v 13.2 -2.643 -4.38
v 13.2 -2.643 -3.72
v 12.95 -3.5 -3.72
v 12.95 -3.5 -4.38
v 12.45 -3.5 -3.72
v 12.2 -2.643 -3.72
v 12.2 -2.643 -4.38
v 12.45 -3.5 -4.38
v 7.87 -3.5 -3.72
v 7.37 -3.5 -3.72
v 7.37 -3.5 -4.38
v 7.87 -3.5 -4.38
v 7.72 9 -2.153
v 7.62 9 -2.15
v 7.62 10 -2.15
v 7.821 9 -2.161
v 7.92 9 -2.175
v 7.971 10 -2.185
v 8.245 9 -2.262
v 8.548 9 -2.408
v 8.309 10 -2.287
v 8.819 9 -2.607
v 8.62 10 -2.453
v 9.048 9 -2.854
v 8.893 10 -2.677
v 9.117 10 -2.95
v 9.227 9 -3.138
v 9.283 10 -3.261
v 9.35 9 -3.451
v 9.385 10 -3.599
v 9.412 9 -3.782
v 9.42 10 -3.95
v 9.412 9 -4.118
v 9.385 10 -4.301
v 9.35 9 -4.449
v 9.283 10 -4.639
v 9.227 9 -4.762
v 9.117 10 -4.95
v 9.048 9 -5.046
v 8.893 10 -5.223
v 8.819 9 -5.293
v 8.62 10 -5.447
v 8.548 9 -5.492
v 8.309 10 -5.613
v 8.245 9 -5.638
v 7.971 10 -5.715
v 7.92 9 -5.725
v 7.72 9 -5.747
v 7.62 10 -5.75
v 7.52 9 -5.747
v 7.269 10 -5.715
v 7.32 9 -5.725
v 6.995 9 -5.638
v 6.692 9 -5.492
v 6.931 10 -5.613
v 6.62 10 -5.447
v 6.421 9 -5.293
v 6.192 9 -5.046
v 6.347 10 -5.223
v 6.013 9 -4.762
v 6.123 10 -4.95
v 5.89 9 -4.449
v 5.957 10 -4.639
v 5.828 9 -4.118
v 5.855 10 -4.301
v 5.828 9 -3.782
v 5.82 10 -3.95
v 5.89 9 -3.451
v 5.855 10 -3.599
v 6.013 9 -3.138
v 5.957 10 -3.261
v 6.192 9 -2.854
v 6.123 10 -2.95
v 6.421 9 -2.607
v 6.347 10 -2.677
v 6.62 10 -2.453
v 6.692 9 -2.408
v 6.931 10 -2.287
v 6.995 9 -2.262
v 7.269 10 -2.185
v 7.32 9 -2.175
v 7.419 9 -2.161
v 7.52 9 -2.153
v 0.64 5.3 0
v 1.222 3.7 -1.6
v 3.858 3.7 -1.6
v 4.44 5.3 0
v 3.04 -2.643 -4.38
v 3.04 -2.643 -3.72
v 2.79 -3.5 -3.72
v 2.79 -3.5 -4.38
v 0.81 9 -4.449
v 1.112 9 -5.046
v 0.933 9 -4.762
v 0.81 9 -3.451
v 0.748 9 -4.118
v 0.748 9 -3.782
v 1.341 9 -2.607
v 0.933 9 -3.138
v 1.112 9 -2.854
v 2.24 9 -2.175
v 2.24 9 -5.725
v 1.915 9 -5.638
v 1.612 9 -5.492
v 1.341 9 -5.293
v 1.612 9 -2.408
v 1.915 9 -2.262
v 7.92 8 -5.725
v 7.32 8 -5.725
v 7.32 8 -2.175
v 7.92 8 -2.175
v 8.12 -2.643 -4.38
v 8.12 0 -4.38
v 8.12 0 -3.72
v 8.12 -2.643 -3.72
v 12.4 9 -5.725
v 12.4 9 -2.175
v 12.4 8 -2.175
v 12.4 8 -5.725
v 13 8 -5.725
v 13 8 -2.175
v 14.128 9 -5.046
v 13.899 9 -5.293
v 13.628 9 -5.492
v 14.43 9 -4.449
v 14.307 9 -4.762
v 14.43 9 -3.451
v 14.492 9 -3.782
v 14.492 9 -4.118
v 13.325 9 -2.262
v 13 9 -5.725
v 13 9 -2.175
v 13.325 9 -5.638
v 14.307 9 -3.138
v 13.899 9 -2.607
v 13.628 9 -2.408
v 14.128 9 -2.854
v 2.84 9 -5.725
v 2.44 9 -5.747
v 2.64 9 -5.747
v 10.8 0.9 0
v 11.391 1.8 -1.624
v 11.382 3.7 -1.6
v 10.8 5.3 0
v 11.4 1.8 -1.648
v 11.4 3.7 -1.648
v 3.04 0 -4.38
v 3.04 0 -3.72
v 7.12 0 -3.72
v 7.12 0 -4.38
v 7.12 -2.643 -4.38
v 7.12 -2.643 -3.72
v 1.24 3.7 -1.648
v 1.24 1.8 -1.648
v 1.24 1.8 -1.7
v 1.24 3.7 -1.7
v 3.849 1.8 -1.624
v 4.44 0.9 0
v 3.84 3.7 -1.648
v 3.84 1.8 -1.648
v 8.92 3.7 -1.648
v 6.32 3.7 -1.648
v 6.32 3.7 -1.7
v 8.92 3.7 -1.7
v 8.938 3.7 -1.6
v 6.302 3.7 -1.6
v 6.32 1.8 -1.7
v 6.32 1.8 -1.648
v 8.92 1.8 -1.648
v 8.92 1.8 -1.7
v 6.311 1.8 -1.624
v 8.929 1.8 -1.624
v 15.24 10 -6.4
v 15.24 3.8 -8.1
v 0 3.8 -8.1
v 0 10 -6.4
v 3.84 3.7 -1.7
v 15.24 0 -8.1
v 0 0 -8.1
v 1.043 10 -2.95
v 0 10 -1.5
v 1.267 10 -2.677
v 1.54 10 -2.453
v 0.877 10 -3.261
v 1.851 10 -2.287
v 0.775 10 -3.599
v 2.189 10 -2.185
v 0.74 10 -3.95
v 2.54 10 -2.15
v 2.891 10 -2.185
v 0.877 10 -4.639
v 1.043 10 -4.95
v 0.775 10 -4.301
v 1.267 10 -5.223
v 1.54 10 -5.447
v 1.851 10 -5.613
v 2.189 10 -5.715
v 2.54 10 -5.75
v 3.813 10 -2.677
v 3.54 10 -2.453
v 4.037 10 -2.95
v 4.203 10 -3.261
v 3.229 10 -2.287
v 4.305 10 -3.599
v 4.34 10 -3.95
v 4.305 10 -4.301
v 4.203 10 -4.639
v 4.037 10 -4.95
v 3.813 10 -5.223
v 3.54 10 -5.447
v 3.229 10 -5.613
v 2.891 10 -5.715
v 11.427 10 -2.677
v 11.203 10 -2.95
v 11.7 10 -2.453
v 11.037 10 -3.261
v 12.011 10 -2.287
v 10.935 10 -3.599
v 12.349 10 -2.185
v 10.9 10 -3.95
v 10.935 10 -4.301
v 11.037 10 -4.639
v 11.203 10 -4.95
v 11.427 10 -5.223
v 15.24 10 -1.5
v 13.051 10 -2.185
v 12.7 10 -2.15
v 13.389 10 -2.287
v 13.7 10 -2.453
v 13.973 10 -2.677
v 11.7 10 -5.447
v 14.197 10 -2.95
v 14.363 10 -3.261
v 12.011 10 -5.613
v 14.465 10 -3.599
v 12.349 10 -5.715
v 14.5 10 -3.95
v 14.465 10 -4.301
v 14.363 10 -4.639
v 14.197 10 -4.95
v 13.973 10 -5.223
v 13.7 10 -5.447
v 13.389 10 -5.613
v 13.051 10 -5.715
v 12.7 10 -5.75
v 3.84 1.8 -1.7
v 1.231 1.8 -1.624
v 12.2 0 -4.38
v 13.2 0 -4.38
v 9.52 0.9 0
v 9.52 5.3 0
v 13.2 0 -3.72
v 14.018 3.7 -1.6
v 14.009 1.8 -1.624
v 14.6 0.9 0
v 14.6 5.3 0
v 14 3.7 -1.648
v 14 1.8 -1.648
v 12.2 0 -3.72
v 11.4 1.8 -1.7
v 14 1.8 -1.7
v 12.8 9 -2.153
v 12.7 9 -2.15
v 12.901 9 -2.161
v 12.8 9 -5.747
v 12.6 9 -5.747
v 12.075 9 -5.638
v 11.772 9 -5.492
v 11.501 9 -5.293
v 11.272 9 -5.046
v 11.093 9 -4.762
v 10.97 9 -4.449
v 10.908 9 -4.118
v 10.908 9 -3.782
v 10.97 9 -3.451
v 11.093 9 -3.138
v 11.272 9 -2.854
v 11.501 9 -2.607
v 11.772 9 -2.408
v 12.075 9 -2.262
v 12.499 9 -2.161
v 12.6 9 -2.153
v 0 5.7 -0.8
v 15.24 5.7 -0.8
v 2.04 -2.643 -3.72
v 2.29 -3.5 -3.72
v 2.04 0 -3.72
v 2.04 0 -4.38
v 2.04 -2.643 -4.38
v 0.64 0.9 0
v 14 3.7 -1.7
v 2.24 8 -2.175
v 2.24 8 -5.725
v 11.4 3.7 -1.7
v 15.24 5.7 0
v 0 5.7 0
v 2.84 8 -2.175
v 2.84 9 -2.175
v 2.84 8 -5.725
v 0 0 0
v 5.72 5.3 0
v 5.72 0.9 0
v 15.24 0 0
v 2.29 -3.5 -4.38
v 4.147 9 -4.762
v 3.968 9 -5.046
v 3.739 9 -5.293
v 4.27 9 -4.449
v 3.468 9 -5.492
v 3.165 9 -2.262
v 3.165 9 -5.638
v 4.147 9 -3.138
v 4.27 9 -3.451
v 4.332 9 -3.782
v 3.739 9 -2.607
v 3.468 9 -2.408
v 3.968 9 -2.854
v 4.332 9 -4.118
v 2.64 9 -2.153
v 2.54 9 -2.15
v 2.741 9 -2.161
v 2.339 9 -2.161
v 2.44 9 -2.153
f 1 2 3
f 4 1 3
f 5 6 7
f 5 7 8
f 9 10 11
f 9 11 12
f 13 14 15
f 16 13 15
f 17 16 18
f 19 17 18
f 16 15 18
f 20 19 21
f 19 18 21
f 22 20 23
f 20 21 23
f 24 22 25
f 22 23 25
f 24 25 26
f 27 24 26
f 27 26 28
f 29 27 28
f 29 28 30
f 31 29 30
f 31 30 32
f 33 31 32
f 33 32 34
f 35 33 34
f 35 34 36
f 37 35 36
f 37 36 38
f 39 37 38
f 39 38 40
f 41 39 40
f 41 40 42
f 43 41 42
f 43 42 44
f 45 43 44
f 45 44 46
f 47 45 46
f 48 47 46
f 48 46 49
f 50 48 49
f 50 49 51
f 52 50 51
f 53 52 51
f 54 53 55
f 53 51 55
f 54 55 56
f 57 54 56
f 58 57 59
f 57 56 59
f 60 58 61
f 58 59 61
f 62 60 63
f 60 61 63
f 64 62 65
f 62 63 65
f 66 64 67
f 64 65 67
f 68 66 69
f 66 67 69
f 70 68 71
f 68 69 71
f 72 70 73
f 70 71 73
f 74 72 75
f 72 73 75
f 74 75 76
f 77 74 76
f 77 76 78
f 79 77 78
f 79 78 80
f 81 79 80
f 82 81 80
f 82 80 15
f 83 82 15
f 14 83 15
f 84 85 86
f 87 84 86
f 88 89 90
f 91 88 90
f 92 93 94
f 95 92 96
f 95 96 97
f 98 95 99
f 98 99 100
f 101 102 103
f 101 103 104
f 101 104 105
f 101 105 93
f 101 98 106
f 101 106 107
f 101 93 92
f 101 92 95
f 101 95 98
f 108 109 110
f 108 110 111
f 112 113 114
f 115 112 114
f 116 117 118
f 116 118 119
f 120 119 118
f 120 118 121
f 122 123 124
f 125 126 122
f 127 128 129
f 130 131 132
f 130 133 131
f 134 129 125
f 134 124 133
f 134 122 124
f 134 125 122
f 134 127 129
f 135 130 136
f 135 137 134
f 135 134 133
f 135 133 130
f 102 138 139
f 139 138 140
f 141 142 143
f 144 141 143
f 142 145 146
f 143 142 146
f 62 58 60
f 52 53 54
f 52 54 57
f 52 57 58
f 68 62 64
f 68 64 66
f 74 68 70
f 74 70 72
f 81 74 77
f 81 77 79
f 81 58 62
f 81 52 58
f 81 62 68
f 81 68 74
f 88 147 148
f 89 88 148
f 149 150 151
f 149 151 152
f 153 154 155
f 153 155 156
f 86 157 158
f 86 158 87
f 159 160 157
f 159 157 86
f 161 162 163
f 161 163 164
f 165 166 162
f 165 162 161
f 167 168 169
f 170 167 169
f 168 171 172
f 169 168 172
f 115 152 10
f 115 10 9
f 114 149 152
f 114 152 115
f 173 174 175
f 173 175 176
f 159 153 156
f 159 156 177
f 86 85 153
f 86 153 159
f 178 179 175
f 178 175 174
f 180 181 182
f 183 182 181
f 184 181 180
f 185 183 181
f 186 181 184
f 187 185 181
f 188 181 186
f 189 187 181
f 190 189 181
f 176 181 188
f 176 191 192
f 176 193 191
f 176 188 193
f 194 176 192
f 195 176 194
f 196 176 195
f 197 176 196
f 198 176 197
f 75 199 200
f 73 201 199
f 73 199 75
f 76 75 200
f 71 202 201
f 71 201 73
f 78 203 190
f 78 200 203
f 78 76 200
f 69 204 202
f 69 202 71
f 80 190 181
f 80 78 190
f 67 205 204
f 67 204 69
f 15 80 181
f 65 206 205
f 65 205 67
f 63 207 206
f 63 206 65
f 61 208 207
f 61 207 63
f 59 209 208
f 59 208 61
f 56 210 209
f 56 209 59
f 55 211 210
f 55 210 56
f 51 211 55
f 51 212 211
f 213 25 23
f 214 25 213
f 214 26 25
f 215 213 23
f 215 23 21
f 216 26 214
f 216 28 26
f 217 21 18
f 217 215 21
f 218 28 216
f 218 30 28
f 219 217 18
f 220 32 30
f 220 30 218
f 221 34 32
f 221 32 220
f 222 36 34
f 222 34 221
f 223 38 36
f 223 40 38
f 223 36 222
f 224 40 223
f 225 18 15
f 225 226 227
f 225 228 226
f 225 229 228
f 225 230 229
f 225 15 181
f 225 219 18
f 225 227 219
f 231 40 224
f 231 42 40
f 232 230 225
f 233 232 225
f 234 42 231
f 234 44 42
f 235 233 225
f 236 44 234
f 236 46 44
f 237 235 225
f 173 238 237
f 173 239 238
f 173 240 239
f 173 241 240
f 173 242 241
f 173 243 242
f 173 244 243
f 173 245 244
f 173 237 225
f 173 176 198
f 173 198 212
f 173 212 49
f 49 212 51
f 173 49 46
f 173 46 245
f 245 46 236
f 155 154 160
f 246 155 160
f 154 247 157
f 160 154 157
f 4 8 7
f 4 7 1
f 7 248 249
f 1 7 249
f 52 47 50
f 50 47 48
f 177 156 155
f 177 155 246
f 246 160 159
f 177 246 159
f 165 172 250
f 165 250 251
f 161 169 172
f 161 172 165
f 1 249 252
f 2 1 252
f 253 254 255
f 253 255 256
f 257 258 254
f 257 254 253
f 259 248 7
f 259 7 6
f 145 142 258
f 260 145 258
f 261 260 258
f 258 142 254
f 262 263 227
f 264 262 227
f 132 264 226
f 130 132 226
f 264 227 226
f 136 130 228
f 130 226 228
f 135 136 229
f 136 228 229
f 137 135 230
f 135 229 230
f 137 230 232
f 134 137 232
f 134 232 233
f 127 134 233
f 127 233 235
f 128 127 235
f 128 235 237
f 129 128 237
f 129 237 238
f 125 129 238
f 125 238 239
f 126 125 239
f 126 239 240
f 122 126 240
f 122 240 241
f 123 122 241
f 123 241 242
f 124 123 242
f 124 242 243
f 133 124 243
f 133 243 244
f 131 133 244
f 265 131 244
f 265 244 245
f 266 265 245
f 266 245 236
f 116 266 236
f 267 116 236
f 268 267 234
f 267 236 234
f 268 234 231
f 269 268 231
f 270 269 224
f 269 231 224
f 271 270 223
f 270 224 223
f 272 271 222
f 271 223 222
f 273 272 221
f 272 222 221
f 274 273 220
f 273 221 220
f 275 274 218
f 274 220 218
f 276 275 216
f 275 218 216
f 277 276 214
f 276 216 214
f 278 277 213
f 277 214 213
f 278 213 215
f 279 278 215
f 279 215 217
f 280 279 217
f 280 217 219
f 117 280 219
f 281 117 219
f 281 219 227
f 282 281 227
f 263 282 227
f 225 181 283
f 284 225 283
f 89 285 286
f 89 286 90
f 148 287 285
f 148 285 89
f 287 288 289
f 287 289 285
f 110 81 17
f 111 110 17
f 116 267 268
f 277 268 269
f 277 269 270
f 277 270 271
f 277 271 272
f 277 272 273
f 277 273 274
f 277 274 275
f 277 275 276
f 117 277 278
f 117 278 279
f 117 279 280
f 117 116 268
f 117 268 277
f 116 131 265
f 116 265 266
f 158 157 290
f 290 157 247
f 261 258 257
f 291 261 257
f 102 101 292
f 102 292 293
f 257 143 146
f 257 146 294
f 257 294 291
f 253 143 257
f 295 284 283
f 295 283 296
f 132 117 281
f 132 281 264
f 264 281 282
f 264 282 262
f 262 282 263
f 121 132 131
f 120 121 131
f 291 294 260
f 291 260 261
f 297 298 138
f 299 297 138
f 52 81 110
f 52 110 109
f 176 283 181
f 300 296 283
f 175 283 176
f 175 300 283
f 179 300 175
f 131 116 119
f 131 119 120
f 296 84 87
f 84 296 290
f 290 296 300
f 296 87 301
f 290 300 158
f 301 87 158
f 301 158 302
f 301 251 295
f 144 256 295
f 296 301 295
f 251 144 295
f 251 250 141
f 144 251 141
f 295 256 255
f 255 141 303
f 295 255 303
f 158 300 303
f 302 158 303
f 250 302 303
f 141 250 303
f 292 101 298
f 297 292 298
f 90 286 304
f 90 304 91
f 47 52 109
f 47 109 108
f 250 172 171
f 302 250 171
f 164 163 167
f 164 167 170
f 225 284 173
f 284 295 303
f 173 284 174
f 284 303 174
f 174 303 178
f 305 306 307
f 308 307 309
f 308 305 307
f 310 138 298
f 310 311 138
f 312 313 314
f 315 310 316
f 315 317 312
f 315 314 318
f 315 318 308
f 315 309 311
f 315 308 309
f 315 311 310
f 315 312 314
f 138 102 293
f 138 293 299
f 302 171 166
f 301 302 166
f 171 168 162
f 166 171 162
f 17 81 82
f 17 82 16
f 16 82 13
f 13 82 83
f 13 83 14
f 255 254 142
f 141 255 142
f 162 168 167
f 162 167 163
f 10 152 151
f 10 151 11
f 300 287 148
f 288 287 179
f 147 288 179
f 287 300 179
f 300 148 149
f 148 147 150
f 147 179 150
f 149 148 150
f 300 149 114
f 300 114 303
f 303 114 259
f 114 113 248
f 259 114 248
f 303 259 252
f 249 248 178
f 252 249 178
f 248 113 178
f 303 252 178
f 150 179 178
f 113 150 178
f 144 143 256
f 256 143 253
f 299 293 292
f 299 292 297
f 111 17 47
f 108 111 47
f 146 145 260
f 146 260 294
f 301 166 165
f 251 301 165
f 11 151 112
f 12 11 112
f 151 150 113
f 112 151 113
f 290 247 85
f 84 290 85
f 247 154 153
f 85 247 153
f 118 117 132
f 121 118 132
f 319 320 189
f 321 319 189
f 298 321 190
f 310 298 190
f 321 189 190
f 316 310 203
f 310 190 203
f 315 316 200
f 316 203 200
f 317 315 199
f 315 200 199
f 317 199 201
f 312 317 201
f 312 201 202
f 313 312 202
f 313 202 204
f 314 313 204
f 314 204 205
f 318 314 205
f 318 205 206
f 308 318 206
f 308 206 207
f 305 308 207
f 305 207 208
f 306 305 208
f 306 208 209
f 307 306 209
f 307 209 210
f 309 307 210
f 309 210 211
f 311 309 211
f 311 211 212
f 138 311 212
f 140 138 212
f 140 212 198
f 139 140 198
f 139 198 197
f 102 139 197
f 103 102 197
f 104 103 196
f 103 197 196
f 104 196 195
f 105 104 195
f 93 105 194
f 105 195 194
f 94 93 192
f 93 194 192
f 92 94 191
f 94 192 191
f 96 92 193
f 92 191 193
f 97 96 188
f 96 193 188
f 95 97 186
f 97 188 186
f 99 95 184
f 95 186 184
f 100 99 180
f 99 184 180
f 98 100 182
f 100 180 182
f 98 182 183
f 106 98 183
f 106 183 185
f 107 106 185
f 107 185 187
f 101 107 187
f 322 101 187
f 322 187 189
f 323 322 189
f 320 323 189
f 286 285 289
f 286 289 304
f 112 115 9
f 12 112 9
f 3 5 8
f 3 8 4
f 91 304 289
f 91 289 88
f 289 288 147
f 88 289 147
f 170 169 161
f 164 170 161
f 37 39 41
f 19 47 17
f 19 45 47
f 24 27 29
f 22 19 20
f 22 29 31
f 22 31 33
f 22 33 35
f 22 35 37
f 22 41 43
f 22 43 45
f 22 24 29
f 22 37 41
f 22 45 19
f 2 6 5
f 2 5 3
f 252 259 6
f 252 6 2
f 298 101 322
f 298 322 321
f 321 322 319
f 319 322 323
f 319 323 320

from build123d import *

# Parameters (mm, degrees)
SKETCH1_W                   = 15.24
SKETCH1_H                   = 8.1
BOSS_EXTRUDE1_DEPTH         = 10
CUT_EXTRUDE1_DEPTH          = 20.946618761
CUT_EXTRUDE2_DEPTH          = 20.946618761
SKETCH4_W                   = 1
SKETCH4_H                   = 0.66
BOSS_EXTRUDE2_DEPTH         = 3.5
CUT_EXTRUDE3_REACH          = 20.747
LPATTERN1_COUNT             = 3
LPATTERN1_PITCH             = 5.08
SKETCH6_W                   = 2.6
SKETCH6_H                   = 1.9
CUT_EXTRUDE4_DEPTH          = 1.7
CHAMFER1_SIZE               = 0.6
CHAMFER1_SIZE2              = 1.648486452
CHAMFER2_SIZE               = 0.6
CHAMFER2_SIZE2              = 1.648486452
CHAMFER3_SIZE               = 1.6
CHAMFER4_SIZE               = 0.9
CHAMFER4_SIZE2              = 1.62364298
LPATTERN2_COUNT             = 3
LPATTERN2_PITCH             = 5.08
CHAMFER1_OF_LPATTERN2_SIZE2 = 1.648486452
CHAMFER1_OF_LPATTERN2_SIZE  = 0.6
CHAMFER2_OF_LPATTERN2_SIZE2 = 1.648486452
CHAMFER2_OF_LPATTERN2_SIZE  = 0.6
CHAMFER3_OF_LPATTERN2_SIZE  = 1.6
CHAMFER4_OF_LPATTERN2_SIZE2 = 1.62364298
CHAMFER4_OF_LPATTERN2_SIZE  = 0.9
SKETCH7_R                   = 1.8
CUT_EXTRUDE5_DEPTH          = 1
SKETCH8_W                   = 0.6
SKETCH8_H                   = 3.54964787
CUT_EXTRUDE6_DEPTH          = 1
LPATTERN3_COUNT             = 3
LPATTERN3_PITCH             = 5.08


with BuildPart() as part:
    # Sketch1 → Boss-Extrude1 (new body)
    with BuildSketch(Plane(origin=(0, 0, 0), x_dir=(1, 0, 0), z_dir=(0, 1, 0))):
        with Locations((7.62, 4.05)):
            Rectangle(SKETCH1_W, SKETCH1_H)
    extrude(amount=BOSS_EXTRUDE1_DEPTH)

    # Sketch2 → Cut-Extrude1 (cut, through all)
    with BuildSketch(Plane(origin=(15.24, 0, 0), x_dir=(0, 0, -1), z_dir=(1, 0, 0))):
        Polygon((0, 10), (1.5, 10), (0.8, 5.7), (0, 5.7), align=None)
    extrude(amount=-CUT_EXTRUDE1_DEPTH, mode=Mode.SUBTRACT)

    # Sketch3 → Cut-Extrude2 (cut, through all)
    with BuildSketch(Plane(origin=(15.24, 0, 0), x_dir=(0, 0, -1), z_dir=(1, 0, 0))):
        Polygon((8.1, 3.8), (6.4, 10), (8.1, 10), align=None)
    extrude(amount=-CUT_EXTRUDE2_DEPTH, mode=Mode.SUBTRACT)

    # Sketch4 → Boss-Extrude2 (add)
    with BuildSketch(Plane.XZ):
        with Locations((2.54, -4.05)):
            Rectangle(SKETCH4_W, SKETCH4_H)
    boss_extrude2 = extrude(amount=BOSS_EXTRUDE2_DEPTH)

    # Sketch5 → Cut-Extrude3 (cut, up to next)
    with BuildSketch(Plane.XY.offset(-3.72), mode=Mode.PRIVATE) as cut_extrude3_sk1:
        Polygon((2.04, -2.643369181), (2.29, -3.5), (2.04, -3.5), align=None)
    cut_extrude3_tool1 = extrude(cut_extrude3_sk1.sketch, amount=-CUT_EXTRUDE3_REACH, mode=Mode.PRIVATE) & part.part
    # Sketch5 → Cut-Extrude3 (cut, up to next)
    with BuildSketch(Plane.XY.offset(-3.72), mode=Mode.PRIVATE) as cut_extrude3_sk2:
        Polygon((2.79, -3.5), (3.04, -3.5), (3.04, -2.643369181), align=None)
    cut_extrude3_tool2 = extrude(cut_extrude3_sk2.sketch, amount=-CUT_EXTRUDE3_REACH, mode=Mode.PRIVATE) & part.part
    cut_extrude3_1 = cut_extrude3_tool1.solids().sort_by_distance((2.123333, -3.214456, -3.72))[0]
    add(cut_extrude3_1, mode=Mode.SUBTRACT)
    cut_extrude3_2 = cut_extrude3_tool2.solids().sort_by_distance((2.956667, -3.214456, -3.72))[0]
    add(cut_extrude3_2, mode=Mode.SUBTRACT)
    cut_extrude3 = cut_extrude3_1 + cut_extrude3_2  # Cut-Extrude3 as one shape, for the pattern or mirror that repeats it

    # LPattern1: Boss-Extrude2, Cut-Extrude3 ×3
    with Locations(*[(i * LPATTERN1_PITCH, 0, 0) for i in range(1, LPATTERN1_COUNT)]):
        add(boss_extrude2)
        add(cut_extrude3, mode=Mode.SUBTRACT)

    # Sketch6 → Cut-Extrude4 (cut)
    with BuildSketch(Plane.XY):
        with Locations((2.54, 2.75)):
            Rectangle(SKETCH6_W, SKETCH6_H)
    cut_extrude4 = extrude(amount=-CUT_EXTRUDE4_DEPTH, mode=Mode.SUBTRACT)

    # Chamfer1
    chamfer1_edges = [part.edges().sort_by_distance(p)[0] for p in [
        (1.24, 2.75, 0),
    ]]
    chamfer1_side = [part.faces().sort_by_distance(p)[0] for p in [
        (7.926307978, 2.856029685, 0),
    ]]
    chamfer(chamfer1_edges, length=CHAMFER1_SIZE, length2=CHAMFER1_SIZE2, reference=chamfer1_side[0])

    # Chamfer2
    chamfer2_edges = [part.edges().sort_by_distance(p)[0] for p in [
        (3.84, 2.75, 0),
    ]]
    chamfer2_side = [part.faces().sort_by_distance(p)[0] for p in [
        (8.024891816, 2.85752587, 0),
    ]]
    chamfer(chamfer2_edges, length=CHAMFER2_SIZE, length2=CHAMFER2_SIZE2, reference=chamfer2_side[0])

    # Chamfer3
    chamfer3_edges = [part.edges().sort_by_distance(p)[0] for p in [
        (2.54, 3.7, 0),
    ]]
    chamfer(chamfer3_edges, length=CHAMFER3_SIZE)

    # Chamfer4
    chamfer4_edges = [part.edges().sort_by_distance(p)[0] for p in [
        (2.54, 1.8, 0),
    ]]
    chamfer4_side = [part.faces().sort_by_distance(p)[0] for p in [
        (8.53838843, 2.723450413, 0),
    ]]
    chamfer(chamfer4_edges, length=CHAMFER4_SIZE, length2=CHAMFER4_SIZE2, reference=chamfer4_side[0])

    # LPattern2: Cut-Extrude4 ×3
    with Locations(*[(i * LPATTERN2_PITCH, 0, 0) for i in range(1, LPATTERN2_COUNT)]):
        add(cut_extrude4, mode=Mode.SUBTRACT)

    # Chamfer1 of LPattern2
    chamfer1_of_lpattern2_edges = [part.edges().sort_by_distance(p)[0] for p in [
        (6.32, 2.75, 0),
        (11.4, 2.75, 0),
    ]]
    chamfer(chamfer1_of_lpattern2_edges, length=CHAMFER1_OF_LPATTERN2_SIZE, length2=CHAMFER1_OF_LPATTERN2_SIZE2)

    # Chamfer2 of LPattern2
    chamfer2_of_lpattern2_edges = [part.edges().sort_by_distance(p)[0] for p in [
        (8.92, 2.75, 0),
        (14, 2.75, 0),
    ]]
    chamfer(chamfer2_of_lpattern2_edges, length=CHAMFER2_OF_LPATTERN2_SIZE, length2=CHAMFER2_OF_LPATTERN2_SIZE2)

    # Chamfer3 of LPattern2
    chamfer3_of_lpattern2_edges = [part.edges().sort_by_distance(p)[0] for p in [
        (7.62, 3.7, 0),
        (12.7, 3.7, 0),
    ]]
    chamfer(chamfer3_of_lpattern2_edges, length=CHAMFER3_OF_LPATTERN2_SIZE)

    # Chamfer4 of LPattern2
    chamfer4_of_lpattern2_edges = [part.edges().sort_by_distance(p)[0] for p in [
        (7.62, 1.8, 0),
        (12.7, 1.8, 0),
    ]]
    chamfer(chamfer4_of_lpattern2_edges, length=CHAMFER4_OF_LPATTERN2_SIZE, length2=CHAMFER4_OF_LPATTERN2_SIZE2)

    # Sketch7 → Cut-Extrude5 (cut)
    with BuildSketch(Plane(origin=(0, 10, 0), x_dir=(1, 0, 0), z_dir=(0, 1, 0))):
        with Locations(Location((12.7, 3.95, 0), (0, 0, 270))):
            Circle(SKETCH7_R)
    cut_extrude5 = extrude(amount=-CUT_EXTRUDE5_DEPTH, mode=Mode.SUBTRACT)

    # Sketch8 → Cut-Extrude6 (cut)
    with BuildSketch(Plane(origin=(0, 9, 0), x_dir=(1, 0, 0), z_dir=(0, 1, 0))):
        with Locations((12.7, 3.95)):
            Rectangle(SKETCH8_W, SKETCH8_H)
    cut_extrude6 = extrude(amount=-CUT_EXTRUDE6_DEPTH, mode=Mode.SUBTRACT)

    # LPattern3: Cut-Extrude5, Cut-Extrude6 ×3
    with Locations(*[(-i * LPATTERN3_PITCH, 0, 0) for i in range(1, LPATTERN3_COUNT)]):
        add(cut_extrude5, mode=Mode.SUBTRACT)
        add(cut_extrude6, mode=Mode.SUBTRACT)


solid = part.part
